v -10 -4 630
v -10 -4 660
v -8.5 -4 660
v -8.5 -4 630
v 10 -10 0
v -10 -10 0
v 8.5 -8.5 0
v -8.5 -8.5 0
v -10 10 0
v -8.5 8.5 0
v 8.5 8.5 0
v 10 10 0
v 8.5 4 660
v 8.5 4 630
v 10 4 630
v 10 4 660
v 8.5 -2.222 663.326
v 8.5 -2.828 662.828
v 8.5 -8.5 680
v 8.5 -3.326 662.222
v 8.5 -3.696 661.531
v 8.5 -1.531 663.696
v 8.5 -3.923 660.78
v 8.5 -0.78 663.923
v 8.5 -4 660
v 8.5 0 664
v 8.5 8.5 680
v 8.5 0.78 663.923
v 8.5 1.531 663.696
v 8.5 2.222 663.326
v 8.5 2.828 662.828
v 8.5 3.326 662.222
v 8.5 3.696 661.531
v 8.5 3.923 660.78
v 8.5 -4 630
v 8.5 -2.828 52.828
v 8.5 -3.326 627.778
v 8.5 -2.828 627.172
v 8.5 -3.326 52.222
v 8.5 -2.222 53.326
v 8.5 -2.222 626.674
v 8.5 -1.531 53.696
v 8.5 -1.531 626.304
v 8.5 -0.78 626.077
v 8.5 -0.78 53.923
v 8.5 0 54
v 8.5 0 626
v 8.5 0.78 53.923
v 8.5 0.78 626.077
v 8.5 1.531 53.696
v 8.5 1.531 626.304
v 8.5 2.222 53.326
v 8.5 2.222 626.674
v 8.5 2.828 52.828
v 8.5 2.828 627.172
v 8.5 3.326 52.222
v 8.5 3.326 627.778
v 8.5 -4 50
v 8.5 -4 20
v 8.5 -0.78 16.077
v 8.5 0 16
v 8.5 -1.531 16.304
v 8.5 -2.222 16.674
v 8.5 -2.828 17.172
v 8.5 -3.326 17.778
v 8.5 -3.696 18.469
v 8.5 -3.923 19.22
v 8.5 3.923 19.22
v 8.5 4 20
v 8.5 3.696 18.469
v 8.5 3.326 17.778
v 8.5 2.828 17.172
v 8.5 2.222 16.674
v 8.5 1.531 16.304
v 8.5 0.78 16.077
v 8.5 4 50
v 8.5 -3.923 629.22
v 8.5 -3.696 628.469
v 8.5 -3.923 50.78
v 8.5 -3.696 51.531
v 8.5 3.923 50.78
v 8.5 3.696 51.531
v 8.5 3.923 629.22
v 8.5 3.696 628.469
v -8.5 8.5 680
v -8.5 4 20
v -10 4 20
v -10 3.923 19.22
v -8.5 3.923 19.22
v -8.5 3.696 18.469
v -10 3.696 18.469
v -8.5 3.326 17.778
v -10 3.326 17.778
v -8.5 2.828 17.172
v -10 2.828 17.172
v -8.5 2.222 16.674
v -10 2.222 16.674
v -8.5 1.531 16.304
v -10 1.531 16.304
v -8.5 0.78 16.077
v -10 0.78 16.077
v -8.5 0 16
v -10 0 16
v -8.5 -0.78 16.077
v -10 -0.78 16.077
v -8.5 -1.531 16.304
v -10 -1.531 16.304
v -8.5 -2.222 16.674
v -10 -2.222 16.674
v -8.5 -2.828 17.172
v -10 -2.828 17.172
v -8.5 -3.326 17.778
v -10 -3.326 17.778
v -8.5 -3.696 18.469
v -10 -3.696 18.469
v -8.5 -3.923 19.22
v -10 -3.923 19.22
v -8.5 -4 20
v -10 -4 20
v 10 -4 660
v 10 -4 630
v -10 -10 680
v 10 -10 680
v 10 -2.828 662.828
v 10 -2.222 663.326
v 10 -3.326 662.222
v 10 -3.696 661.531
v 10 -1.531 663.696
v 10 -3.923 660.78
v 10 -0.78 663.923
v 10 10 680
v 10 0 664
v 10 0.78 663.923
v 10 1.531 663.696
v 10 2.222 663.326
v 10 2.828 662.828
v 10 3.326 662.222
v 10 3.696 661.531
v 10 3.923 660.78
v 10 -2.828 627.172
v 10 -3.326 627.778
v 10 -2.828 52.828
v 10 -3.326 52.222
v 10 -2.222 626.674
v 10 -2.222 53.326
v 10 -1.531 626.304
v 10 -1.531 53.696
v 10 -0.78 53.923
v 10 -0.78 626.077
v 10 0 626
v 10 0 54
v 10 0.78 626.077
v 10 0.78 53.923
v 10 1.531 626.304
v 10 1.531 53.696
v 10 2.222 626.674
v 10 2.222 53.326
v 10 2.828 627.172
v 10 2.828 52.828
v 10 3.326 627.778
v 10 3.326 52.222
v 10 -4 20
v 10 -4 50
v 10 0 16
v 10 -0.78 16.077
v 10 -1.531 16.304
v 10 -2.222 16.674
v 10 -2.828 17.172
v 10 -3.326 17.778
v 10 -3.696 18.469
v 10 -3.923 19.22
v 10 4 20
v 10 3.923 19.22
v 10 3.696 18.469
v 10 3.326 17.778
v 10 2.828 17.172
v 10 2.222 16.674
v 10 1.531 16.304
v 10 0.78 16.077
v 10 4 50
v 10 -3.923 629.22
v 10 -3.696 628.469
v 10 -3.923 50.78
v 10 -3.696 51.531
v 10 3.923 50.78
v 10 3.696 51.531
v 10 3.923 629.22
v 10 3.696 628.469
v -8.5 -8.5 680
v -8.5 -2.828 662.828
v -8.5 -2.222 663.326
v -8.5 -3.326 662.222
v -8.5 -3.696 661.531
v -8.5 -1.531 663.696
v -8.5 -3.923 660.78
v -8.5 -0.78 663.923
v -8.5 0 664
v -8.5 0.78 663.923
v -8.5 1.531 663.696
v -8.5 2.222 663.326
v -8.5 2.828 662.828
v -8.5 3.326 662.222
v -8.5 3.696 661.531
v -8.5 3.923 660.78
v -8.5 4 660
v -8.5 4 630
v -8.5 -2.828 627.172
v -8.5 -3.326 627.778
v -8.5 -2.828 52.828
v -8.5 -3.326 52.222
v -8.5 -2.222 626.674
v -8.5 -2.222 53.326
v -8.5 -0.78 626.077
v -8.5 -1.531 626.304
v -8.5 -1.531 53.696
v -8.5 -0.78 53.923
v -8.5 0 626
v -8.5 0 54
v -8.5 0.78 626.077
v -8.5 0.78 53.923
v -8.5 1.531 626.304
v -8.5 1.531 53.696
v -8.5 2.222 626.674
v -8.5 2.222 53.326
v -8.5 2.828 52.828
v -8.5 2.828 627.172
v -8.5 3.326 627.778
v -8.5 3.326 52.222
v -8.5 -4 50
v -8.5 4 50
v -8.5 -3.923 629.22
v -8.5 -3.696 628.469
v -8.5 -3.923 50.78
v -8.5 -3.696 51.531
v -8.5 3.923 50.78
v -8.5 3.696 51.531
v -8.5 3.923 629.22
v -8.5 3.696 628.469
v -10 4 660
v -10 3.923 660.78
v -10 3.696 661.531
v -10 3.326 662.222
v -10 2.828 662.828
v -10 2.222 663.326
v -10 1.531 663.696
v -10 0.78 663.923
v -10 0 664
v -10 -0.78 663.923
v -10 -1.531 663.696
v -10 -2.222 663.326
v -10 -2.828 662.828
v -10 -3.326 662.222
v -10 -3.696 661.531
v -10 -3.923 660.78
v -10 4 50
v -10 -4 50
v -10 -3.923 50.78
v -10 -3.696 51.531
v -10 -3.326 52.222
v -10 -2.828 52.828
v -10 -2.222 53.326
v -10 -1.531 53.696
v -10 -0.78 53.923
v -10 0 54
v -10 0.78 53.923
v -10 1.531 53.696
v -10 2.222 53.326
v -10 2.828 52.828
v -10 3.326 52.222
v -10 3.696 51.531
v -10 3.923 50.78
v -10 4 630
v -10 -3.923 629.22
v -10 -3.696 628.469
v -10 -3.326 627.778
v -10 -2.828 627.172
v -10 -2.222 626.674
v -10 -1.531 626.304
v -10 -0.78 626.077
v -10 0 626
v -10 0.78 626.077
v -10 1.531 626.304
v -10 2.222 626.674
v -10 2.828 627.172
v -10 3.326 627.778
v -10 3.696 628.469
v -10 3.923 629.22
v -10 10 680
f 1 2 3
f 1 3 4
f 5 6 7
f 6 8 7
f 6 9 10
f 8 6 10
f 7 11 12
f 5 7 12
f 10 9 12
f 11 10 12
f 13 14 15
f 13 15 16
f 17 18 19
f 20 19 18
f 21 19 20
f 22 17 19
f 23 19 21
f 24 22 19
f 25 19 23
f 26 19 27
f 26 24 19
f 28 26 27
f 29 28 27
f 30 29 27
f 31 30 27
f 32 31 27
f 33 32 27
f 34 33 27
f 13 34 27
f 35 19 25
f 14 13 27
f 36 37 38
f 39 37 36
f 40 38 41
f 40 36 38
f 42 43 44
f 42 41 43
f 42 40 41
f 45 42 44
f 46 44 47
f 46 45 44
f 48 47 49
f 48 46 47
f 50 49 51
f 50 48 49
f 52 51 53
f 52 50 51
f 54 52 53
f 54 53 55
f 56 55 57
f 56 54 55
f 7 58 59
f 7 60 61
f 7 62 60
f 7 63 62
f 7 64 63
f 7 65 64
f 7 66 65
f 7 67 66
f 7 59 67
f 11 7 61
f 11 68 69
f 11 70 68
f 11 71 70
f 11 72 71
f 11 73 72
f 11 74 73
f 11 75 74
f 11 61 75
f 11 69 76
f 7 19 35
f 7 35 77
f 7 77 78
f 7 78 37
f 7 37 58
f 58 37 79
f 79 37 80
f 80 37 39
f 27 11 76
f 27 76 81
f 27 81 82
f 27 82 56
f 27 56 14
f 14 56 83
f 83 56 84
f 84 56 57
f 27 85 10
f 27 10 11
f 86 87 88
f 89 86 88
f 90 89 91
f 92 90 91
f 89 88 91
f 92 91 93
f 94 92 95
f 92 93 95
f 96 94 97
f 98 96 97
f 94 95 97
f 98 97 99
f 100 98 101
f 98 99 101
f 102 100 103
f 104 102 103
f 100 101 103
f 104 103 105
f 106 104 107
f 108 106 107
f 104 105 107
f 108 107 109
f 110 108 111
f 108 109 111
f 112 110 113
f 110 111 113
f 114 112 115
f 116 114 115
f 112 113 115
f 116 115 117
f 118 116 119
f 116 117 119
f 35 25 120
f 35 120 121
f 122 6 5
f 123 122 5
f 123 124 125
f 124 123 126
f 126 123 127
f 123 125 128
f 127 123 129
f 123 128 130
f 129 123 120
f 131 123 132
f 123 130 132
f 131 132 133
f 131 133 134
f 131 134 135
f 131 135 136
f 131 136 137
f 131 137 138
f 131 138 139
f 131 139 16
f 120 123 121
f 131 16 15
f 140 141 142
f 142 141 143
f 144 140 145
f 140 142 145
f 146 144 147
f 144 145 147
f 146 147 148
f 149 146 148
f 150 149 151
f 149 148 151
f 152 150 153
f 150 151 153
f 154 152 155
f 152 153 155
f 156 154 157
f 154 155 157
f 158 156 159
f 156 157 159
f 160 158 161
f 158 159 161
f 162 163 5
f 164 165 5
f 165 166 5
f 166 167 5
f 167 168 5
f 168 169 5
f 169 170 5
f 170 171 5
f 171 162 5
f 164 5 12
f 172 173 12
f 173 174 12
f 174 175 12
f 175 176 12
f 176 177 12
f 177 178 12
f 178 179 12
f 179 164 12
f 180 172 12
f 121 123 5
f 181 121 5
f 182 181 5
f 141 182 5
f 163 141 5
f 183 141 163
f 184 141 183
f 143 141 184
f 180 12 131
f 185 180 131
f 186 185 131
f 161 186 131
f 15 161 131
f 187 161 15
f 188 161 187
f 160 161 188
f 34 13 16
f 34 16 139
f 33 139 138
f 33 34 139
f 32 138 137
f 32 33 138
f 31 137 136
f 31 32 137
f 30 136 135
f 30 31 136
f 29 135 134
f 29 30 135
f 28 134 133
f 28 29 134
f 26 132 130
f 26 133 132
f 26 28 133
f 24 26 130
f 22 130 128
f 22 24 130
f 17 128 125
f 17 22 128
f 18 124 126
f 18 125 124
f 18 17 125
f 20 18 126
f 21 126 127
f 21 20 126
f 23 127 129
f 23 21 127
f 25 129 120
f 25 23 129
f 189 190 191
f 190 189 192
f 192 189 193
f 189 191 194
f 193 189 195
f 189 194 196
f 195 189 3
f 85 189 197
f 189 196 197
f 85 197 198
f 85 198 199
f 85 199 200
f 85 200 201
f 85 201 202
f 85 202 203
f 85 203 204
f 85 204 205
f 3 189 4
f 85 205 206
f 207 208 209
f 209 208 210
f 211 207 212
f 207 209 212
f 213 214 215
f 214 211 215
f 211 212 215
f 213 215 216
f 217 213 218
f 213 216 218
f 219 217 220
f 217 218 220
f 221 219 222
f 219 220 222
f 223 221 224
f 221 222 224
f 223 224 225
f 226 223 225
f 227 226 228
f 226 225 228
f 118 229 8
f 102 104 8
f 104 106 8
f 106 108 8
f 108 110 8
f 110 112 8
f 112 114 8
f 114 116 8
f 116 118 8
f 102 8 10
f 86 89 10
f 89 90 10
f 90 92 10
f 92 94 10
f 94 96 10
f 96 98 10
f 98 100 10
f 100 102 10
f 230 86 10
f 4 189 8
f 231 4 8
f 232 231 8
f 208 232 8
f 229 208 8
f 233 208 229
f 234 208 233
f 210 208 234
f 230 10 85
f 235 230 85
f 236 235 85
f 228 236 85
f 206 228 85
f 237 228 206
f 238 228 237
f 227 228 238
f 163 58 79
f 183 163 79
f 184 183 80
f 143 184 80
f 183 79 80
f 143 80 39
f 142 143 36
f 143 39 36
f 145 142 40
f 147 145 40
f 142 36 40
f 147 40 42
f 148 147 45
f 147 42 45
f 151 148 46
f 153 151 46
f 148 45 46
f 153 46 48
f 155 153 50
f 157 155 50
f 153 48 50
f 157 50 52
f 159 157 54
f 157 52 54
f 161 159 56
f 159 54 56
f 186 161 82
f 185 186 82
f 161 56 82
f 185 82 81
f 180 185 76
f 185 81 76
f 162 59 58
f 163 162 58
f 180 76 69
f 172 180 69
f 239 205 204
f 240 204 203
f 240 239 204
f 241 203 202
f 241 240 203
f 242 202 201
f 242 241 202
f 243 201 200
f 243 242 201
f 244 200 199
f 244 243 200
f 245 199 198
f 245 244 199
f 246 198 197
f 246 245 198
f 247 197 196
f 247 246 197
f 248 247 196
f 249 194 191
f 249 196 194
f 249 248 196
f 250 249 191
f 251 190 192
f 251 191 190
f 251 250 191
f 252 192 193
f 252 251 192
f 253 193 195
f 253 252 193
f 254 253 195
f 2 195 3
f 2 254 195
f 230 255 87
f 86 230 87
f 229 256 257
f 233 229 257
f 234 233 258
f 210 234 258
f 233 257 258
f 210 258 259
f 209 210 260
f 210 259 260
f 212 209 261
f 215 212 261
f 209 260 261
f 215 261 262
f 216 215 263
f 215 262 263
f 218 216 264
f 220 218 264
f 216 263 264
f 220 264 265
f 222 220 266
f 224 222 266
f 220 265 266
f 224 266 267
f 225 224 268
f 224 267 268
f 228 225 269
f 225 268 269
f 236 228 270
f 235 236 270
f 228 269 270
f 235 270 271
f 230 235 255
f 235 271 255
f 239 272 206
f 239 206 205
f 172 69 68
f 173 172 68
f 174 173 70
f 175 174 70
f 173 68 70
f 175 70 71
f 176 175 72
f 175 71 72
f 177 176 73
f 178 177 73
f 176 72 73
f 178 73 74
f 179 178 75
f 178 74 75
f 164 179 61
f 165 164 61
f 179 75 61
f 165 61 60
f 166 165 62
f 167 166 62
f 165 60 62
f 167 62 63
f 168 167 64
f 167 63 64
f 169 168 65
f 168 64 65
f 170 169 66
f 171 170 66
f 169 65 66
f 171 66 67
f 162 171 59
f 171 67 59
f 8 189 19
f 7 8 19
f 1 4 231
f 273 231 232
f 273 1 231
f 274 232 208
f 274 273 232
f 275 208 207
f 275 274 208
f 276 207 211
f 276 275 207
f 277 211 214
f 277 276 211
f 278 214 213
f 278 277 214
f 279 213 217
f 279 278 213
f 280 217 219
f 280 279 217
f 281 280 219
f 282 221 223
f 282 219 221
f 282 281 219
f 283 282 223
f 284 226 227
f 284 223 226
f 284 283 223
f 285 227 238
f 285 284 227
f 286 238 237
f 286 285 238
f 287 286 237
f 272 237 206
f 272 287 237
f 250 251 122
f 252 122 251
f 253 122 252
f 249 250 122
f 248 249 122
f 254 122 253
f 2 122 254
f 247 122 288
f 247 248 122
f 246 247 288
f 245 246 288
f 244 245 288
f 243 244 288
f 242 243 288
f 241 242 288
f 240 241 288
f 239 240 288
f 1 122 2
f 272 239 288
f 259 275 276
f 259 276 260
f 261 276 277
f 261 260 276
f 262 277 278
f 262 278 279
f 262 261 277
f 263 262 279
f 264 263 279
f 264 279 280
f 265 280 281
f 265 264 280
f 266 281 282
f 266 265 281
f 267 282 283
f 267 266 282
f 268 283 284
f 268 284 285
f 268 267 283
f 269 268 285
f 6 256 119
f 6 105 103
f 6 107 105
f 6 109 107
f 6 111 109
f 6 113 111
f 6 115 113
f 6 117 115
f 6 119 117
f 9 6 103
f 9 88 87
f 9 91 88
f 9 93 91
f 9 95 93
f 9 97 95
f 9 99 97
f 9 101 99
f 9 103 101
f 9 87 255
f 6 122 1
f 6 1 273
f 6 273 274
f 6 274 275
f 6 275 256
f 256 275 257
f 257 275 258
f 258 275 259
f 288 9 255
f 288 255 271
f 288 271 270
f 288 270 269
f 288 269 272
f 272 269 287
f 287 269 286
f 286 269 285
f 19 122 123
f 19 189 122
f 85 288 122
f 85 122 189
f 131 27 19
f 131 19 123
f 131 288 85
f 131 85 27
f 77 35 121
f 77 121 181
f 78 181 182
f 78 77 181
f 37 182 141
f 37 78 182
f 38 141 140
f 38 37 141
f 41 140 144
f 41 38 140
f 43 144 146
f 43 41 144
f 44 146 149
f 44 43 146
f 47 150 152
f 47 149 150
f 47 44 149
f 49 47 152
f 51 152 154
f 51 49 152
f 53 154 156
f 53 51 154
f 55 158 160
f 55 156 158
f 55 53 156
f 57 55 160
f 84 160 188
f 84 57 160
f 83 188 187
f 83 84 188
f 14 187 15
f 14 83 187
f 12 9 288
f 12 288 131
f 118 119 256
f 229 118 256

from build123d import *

# Parameters (mm, degrees)
SKETCH_1_W          = 20
SKETCH_1_H          = 20
SKETCH_1_W_2        = 17
SKETCH_1_H_2        = 17
EXTRUDE_1_DEPTH     = 680
CUT_EXTRUDE_1_DEPTH = 681.367547727


with BuildPart() as part:
    # ｽｹｯﾁ1 → ﾎﾞｽ - 押し出し1 (new body)
    with BuildSketch(Plane.XY):
        Rectangle(SKETCH_1_W, SKETCH_1_H)
        Rectangle(SKETCH_1_W_2, SKETCH_1_H_2, mode=Mode.SUBTRACT)
    extrude(amount=EXTRUDE_1_DEPTH)

    # ｽｹｯﾁ2 → ｶｯﾄ - 押し出し1 (cut, through all)
    with BuildSketch(Plane.ZY.offset(10)):
        with BuildLine():
            Line((660, -4), (630, -4))
            ThreePointArc((630, -4), (626, 0), (630, 4))
            Line((630, 4), (660, 4))
            ThreePointArc((660, 4), (664, 0), (660, -4))
        make_face()
        with BuildLine():
            Line((20, -4), (50, -4))
            ThreePointArc((50, -4), (54, 0), (50, 4))
            Line((50, 4), (20, 4))
            ThreePointArc((20, 4), (16, 0), (20, -4))
        make_face()
    extrude(amount=-CUT_EXTRUDE_1_DEPTH, mode=Mode.SUBTRACT)


solid = part.part
